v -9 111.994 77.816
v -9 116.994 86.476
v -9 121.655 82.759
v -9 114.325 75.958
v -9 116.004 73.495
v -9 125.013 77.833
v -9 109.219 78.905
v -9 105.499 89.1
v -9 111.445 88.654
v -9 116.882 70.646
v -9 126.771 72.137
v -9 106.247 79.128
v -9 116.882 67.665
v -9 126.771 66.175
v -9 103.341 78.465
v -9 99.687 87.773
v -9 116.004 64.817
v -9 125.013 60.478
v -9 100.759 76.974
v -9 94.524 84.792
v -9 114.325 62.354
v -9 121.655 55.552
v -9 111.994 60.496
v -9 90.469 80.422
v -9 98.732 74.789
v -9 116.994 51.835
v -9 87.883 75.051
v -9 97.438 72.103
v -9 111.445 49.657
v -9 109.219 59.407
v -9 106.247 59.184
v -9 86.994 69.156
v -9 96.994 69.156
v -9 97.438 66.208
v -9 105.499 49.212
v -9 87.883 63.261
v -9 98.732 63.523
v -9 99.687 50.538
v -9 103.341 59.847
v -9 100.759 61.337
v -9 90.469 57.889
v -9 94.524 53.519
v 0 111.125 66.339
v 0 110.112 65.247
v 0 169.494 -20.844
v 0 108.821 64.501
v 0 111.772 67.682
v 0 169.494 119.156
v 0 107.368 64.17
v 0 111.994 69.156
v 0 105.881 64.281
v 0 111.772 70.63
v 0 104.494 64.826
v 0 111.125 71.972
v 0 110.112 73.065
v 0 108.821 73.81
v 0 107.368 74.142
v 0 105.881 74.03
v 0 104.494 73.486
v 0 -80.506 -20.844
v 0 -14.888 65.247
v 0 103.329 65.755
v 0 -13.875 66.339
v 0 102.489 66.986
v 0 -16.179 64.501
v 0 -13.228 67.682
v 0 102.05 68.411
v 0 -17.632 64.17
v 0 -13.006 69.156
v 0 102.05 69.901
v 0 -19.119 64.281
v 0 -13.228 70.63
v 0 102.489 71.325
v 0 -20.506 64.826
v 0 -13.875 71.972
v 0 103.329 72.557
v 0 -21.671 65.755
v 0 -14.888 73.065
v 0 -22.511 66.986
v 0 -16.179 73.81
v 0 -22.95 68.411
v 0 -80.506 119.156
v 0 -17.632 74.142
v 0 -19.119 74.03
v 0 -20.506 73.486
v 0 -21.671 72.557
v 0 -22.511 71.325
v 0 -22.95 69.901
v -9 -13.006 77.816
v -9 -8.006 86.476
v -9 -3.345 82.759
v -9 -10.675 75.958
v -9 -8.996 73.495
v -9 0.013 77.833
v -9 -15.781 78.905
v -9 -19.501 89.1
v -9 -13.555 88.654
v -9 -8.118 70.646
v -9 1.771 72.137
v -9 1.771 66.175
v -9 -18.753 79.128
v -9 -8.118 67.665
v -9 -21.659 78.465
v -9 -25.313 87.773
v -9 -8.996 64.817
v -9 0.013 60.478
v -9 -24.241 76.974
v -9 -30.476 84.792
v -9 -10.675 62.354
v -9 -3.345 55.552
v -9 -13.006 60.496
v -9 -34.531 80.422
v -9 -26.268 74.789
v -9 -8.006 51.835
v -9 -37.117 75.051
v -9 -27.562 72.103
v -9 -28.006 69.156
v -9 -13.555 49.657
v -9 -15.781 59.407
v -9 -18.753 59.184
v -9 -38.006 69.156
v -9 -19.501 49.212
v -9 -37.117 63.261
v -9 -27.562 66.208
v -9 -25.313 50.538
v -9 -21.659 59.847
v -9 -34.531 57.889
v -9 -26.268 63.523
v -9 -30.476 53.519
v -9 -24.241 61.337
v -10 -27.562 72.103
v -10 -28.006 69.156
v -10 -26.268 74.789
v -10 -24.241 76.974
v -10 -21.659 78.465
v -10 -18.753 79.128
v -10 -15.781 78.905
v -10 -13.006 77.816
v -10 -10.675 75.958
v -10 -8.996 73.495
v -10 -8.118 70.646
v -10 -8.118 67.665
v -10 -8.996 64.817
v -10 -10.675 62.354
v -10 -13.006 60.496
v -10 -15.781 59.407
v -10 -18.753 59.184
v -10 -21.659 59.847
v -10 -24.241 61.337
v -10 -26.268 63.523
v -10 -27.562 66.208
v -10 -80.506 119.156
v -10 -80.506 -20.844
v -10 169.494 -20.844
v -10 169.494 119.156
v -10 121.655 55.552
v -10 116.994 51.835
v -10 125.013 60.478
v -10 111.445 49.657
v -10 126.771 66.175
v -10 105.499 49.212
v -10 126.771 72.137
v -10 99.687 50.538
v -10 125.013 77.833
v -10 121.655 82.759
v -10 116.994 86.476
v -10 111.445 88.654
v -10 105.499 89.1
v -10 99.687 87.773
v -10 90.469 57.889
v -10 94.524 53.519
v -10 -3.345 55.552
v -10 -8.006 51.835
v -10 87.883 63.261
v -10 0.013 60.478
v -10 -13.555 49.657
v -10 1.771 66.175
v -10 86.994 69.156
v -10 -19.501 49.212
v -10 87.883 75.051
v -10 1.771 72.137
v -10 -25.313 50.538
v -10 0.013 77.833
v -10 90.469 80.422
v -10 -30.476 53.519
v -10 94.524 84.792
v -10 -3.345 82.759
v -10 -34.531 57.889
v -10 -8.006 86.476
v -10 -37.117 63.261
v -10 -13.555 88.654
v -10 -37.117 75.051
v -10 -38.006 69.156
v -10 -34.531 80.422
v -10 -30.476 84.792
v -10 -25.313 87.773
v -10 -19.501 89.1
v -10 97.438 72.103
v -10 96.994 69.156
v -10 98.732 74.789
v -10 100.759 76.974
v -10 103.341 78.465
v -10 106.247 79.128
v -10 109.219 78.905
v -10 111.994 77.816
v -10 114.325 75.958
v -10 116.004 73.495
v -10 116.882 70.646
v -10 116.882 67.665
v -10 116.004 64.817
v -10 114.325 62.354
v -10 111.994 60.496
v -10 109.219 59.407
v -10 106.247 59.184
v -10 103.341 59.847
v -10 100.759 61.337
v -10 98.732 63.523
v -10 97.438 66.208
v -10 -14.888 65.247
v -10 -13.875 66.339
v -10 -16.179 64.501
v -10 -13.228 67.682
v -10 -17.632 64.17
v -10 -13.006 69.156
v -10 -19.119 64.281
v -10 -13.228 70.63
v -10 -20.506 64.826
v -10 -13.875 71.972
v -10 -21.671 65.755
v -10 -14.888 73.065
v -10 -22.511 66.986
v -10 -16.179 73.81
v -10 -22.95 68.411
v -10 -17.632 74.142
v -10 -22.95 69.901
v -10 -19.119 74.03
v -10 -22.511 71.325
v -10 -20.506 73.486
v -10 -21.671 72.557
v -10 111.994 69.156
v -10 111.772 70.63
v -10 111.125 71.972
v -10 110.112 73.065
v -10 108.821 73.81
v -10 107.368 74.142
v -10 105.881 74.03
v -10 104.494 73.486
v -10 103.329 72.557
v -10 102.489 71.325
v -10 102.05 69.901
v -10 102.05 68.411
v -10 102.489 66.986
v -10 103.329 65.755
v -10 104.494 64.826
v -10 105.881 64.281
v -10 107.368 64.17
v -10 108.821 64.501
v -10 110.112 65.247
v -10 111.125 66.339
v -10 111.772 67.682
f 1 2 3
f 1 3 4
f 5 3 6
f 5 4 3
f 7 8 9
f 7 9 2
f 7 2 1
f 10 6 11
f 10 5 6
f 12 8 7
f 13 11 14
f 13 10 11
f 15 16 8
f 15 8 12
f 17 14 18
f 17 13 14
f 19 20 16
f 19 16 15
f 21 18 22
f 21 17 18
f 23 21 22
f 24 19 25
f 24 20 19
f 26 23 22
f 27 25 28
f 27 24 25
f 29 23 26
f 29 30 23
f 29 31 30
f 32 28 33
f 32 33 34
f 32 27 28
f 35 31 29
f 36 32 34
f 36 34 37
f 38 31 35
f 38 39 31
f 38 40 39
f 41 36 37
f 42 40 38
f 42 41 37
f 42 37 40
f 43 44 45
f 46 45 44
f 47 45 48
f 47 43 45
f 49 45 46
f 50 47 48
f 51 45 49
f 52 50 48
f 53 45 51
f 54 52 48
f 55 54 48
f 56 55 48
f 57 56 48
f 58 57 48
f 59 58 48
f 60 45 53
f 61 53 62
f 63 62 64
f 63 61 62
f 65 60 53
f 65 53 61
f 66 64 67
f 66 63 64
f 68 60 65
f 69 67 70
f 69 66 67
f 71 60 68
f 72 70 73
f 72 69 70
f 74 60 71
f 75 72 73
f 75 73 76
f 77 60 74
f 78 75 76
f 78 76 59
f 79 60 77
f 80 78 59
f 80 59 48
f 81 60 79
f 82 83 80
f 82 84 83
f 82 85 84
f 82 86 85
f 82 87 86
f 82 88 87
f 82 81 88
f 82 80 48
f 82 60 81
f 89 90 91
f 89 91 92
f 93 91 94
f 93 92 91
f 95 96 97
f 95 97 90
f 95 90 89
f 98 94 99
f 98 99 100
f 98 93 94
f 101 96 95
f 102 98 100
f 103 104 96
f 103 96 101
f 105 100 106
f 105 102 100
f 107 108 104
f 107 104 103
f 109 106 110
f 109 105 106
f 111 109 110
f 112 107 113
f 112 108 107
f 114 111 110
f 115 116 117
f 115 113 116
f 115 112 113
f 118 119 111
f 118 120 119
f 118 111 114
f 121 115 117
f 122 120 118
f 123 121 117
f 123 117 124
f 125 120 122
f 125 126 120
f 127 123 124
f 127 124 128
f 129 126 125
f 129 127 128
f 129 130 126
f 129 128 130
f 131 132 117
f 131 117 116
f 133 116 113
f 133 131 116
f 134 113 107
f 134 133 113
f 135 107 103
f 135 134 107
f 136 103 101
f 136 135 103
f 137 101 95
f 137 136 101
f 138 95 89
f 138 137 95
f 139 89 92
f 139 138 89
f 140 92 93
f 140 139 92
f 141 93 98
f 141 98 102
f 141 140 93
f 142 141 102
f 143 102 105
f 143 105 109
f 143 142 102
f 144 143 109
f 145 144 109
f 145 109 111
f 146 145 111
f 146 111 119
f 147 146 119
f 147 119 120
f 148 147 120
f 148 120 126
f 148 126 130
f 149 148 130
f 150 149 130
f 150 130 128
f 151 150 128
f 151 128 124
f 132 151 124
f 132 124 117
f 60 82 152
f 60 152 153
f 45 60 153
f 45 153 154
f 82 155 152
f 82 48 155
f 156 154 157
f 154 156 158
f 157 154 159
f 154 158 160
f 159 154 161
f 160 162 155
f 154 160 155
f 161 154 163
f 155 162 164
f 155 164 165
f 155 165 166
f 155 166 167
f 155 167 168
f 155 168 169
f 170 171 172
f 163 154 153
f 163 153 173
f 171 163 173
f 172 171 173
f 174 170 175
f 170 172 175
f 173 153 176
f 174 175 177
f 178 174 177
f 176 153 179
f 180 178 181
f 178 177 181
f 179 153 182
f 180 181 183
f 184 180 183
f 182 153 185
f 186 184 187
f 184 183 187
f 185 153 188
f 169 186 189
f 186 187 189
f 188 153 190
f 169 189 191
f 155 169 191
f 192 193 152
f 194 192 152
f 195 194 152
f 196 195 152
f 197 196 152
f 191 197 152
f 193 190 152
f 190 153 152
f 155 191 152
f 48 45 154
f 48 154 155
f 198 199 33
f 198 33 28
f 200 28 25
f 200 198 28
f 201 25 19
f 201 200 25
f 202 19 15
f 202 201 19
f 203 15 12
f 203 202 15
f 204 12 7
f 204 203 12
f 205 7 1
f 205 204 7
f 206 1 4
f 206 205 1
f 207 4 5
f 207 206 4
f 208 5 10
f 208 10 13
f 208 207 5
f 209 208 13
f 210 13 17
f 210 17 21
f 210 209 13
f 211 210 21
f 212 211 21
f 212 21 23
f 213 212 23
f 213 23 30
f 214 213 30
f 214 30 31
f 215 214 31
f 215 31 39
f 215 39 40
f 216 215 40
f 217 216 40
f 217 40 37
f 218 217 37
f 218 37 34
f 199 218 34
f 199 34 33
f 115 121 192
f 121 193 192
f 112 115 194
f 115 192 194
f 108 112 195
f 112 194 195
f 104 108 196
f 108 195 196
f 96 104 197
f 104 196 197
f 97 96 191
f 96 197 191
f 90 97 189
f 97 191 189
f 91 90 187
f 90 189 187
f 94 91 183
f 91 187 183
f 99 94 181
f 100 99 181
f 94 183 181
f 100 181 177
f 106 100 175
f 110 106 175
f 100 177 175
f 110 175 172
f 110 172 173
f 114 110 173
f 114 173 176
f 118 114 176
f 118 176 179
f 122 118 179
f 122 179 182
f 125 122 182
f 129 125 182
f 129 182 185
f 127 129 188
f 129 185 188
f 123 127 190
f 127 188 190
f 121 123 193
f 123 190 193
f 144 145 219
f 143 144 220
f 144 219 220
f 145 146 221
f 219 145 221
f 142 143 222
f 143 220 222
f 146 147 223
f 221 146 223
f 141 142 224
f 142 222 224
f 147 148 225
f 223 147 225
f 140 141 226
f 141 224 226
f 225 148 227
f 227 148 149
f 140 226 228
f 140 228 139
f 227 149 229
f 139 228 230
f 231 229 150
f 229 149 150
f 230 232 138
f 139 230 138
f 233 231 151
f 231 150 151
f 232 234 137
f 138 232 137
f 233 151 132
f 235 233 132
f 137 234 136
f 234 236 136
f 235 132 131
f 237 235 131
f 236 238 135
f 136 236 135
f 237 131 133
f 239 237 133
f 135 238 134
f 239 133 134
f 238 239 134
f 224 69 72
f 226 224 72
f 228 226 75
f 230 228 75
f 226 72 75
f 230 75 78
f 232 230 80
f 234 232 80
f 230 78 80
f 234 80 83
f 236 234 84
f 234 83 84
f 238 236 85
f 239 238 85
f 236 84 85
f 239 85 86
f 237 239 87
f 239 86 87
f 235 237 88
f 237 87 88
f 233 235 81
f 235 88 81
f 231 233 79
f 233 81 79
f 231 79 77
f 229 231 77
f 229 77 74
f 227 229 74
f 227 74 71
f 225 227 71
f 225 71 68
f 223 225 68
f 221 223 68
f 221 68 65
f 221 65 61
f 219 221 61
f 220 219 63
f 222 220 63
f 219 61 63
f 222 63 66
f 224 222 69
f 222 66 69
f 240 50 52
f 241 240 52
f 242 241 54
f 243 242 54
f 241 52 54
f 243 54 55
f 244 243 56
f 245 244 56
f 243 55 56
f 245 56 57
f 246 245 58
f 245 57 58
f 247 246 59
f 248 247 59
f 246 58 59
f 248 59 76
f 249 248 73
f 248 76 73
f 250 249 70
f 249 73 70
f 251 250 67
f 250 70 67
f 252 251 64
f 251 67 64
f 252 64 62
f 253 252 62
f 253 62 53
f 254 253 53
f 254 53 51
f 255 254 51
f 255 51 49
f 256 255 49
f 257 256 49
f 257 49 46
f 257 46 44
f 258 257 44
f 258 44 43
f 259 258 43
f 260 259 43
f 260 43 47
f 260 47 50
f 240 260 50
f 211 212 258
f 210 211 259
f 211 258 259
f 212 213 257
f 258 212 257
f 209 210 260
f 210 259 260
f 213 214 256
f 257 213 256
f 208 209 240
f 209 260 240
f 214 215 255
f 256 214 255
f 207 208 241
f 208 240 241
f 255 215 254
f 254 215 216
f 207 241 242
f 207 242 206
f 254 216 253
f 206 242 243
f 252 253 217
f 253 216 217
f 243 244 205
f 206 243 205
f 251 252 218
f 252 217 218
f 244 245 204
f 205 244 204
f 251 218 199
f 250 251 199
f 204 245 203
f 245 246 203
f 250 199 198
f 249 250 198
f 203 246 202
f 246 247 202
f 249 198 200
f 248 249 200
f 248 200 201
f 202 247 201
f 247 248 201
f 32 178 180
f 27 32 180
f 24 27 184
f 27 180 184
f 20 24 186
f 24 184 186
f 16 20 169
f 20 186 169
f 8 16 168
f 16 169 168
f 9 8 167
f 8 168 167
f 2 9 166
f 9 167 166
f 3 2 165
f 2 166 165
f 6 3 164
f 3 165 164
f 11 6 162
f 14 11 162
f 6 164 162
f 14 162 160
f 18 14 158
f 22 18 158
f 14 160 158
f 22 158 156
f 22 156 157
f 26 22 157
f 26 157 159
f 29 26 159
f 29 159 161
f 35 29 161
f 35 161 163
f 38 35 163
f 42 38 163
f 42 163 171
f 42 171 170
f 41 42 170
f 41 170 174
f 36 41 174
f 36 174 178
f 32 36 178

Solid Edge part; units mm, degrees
sketch "Sketch1" plane through (0, 0, 0) normal (1, 0, 0) x (0, 1, 0)
  line L0 (-80.5059, -20.8442) -> (169.4941, -20.8442)
  line L1 (169.4941, -20.8442) -> (169.4941, 119.1558)
  line L2 (169.4941, 119.1558) -> (-80.5059, 119.1558)
  line L3 (-80.5059, 119.1558) -> (-80.5059, -20.8442)
  dimension "D1" = 140
  dimension "D2" = 250
extrude "Protrusion1" add sketch "Sketch1" against normal blind 10
sketch "Sketch2" plane through (-10, 44.4941, 29.1558) normal (-1, 0, 0) x (0, -1, 0)
  circle A0 centre (-62.5, 40) radius 10
  circle A1 centre (62.5, 40) radius 20
  circle A2 centre (62.5, 40) radius 10
  circle A3 centre (-62.5, 40) radius 20
  dimension "D1" = 20
  dimension "D2" = 20
  dimension "D3" = 40
  dimension "D4" = 125
  dimension "D5" = 62.5
  dimension "D6" = 50
extrude "Cutout1" cut sketch "Sketch2" against normal blind 1
sketch "Sketch3" plane through (0, 44.4941, 29.1558) normal (1, 0, 0) x (0, 1, 0)
  circle A0 centre (62.5, 40) radius 5
  circle A1 centre (-62.5, 40) radius 5
  dimension "D1" = 10
  dimension "D2" = 10
extrude "Cutout2" cut sketch "Sketch3" against normal through all
